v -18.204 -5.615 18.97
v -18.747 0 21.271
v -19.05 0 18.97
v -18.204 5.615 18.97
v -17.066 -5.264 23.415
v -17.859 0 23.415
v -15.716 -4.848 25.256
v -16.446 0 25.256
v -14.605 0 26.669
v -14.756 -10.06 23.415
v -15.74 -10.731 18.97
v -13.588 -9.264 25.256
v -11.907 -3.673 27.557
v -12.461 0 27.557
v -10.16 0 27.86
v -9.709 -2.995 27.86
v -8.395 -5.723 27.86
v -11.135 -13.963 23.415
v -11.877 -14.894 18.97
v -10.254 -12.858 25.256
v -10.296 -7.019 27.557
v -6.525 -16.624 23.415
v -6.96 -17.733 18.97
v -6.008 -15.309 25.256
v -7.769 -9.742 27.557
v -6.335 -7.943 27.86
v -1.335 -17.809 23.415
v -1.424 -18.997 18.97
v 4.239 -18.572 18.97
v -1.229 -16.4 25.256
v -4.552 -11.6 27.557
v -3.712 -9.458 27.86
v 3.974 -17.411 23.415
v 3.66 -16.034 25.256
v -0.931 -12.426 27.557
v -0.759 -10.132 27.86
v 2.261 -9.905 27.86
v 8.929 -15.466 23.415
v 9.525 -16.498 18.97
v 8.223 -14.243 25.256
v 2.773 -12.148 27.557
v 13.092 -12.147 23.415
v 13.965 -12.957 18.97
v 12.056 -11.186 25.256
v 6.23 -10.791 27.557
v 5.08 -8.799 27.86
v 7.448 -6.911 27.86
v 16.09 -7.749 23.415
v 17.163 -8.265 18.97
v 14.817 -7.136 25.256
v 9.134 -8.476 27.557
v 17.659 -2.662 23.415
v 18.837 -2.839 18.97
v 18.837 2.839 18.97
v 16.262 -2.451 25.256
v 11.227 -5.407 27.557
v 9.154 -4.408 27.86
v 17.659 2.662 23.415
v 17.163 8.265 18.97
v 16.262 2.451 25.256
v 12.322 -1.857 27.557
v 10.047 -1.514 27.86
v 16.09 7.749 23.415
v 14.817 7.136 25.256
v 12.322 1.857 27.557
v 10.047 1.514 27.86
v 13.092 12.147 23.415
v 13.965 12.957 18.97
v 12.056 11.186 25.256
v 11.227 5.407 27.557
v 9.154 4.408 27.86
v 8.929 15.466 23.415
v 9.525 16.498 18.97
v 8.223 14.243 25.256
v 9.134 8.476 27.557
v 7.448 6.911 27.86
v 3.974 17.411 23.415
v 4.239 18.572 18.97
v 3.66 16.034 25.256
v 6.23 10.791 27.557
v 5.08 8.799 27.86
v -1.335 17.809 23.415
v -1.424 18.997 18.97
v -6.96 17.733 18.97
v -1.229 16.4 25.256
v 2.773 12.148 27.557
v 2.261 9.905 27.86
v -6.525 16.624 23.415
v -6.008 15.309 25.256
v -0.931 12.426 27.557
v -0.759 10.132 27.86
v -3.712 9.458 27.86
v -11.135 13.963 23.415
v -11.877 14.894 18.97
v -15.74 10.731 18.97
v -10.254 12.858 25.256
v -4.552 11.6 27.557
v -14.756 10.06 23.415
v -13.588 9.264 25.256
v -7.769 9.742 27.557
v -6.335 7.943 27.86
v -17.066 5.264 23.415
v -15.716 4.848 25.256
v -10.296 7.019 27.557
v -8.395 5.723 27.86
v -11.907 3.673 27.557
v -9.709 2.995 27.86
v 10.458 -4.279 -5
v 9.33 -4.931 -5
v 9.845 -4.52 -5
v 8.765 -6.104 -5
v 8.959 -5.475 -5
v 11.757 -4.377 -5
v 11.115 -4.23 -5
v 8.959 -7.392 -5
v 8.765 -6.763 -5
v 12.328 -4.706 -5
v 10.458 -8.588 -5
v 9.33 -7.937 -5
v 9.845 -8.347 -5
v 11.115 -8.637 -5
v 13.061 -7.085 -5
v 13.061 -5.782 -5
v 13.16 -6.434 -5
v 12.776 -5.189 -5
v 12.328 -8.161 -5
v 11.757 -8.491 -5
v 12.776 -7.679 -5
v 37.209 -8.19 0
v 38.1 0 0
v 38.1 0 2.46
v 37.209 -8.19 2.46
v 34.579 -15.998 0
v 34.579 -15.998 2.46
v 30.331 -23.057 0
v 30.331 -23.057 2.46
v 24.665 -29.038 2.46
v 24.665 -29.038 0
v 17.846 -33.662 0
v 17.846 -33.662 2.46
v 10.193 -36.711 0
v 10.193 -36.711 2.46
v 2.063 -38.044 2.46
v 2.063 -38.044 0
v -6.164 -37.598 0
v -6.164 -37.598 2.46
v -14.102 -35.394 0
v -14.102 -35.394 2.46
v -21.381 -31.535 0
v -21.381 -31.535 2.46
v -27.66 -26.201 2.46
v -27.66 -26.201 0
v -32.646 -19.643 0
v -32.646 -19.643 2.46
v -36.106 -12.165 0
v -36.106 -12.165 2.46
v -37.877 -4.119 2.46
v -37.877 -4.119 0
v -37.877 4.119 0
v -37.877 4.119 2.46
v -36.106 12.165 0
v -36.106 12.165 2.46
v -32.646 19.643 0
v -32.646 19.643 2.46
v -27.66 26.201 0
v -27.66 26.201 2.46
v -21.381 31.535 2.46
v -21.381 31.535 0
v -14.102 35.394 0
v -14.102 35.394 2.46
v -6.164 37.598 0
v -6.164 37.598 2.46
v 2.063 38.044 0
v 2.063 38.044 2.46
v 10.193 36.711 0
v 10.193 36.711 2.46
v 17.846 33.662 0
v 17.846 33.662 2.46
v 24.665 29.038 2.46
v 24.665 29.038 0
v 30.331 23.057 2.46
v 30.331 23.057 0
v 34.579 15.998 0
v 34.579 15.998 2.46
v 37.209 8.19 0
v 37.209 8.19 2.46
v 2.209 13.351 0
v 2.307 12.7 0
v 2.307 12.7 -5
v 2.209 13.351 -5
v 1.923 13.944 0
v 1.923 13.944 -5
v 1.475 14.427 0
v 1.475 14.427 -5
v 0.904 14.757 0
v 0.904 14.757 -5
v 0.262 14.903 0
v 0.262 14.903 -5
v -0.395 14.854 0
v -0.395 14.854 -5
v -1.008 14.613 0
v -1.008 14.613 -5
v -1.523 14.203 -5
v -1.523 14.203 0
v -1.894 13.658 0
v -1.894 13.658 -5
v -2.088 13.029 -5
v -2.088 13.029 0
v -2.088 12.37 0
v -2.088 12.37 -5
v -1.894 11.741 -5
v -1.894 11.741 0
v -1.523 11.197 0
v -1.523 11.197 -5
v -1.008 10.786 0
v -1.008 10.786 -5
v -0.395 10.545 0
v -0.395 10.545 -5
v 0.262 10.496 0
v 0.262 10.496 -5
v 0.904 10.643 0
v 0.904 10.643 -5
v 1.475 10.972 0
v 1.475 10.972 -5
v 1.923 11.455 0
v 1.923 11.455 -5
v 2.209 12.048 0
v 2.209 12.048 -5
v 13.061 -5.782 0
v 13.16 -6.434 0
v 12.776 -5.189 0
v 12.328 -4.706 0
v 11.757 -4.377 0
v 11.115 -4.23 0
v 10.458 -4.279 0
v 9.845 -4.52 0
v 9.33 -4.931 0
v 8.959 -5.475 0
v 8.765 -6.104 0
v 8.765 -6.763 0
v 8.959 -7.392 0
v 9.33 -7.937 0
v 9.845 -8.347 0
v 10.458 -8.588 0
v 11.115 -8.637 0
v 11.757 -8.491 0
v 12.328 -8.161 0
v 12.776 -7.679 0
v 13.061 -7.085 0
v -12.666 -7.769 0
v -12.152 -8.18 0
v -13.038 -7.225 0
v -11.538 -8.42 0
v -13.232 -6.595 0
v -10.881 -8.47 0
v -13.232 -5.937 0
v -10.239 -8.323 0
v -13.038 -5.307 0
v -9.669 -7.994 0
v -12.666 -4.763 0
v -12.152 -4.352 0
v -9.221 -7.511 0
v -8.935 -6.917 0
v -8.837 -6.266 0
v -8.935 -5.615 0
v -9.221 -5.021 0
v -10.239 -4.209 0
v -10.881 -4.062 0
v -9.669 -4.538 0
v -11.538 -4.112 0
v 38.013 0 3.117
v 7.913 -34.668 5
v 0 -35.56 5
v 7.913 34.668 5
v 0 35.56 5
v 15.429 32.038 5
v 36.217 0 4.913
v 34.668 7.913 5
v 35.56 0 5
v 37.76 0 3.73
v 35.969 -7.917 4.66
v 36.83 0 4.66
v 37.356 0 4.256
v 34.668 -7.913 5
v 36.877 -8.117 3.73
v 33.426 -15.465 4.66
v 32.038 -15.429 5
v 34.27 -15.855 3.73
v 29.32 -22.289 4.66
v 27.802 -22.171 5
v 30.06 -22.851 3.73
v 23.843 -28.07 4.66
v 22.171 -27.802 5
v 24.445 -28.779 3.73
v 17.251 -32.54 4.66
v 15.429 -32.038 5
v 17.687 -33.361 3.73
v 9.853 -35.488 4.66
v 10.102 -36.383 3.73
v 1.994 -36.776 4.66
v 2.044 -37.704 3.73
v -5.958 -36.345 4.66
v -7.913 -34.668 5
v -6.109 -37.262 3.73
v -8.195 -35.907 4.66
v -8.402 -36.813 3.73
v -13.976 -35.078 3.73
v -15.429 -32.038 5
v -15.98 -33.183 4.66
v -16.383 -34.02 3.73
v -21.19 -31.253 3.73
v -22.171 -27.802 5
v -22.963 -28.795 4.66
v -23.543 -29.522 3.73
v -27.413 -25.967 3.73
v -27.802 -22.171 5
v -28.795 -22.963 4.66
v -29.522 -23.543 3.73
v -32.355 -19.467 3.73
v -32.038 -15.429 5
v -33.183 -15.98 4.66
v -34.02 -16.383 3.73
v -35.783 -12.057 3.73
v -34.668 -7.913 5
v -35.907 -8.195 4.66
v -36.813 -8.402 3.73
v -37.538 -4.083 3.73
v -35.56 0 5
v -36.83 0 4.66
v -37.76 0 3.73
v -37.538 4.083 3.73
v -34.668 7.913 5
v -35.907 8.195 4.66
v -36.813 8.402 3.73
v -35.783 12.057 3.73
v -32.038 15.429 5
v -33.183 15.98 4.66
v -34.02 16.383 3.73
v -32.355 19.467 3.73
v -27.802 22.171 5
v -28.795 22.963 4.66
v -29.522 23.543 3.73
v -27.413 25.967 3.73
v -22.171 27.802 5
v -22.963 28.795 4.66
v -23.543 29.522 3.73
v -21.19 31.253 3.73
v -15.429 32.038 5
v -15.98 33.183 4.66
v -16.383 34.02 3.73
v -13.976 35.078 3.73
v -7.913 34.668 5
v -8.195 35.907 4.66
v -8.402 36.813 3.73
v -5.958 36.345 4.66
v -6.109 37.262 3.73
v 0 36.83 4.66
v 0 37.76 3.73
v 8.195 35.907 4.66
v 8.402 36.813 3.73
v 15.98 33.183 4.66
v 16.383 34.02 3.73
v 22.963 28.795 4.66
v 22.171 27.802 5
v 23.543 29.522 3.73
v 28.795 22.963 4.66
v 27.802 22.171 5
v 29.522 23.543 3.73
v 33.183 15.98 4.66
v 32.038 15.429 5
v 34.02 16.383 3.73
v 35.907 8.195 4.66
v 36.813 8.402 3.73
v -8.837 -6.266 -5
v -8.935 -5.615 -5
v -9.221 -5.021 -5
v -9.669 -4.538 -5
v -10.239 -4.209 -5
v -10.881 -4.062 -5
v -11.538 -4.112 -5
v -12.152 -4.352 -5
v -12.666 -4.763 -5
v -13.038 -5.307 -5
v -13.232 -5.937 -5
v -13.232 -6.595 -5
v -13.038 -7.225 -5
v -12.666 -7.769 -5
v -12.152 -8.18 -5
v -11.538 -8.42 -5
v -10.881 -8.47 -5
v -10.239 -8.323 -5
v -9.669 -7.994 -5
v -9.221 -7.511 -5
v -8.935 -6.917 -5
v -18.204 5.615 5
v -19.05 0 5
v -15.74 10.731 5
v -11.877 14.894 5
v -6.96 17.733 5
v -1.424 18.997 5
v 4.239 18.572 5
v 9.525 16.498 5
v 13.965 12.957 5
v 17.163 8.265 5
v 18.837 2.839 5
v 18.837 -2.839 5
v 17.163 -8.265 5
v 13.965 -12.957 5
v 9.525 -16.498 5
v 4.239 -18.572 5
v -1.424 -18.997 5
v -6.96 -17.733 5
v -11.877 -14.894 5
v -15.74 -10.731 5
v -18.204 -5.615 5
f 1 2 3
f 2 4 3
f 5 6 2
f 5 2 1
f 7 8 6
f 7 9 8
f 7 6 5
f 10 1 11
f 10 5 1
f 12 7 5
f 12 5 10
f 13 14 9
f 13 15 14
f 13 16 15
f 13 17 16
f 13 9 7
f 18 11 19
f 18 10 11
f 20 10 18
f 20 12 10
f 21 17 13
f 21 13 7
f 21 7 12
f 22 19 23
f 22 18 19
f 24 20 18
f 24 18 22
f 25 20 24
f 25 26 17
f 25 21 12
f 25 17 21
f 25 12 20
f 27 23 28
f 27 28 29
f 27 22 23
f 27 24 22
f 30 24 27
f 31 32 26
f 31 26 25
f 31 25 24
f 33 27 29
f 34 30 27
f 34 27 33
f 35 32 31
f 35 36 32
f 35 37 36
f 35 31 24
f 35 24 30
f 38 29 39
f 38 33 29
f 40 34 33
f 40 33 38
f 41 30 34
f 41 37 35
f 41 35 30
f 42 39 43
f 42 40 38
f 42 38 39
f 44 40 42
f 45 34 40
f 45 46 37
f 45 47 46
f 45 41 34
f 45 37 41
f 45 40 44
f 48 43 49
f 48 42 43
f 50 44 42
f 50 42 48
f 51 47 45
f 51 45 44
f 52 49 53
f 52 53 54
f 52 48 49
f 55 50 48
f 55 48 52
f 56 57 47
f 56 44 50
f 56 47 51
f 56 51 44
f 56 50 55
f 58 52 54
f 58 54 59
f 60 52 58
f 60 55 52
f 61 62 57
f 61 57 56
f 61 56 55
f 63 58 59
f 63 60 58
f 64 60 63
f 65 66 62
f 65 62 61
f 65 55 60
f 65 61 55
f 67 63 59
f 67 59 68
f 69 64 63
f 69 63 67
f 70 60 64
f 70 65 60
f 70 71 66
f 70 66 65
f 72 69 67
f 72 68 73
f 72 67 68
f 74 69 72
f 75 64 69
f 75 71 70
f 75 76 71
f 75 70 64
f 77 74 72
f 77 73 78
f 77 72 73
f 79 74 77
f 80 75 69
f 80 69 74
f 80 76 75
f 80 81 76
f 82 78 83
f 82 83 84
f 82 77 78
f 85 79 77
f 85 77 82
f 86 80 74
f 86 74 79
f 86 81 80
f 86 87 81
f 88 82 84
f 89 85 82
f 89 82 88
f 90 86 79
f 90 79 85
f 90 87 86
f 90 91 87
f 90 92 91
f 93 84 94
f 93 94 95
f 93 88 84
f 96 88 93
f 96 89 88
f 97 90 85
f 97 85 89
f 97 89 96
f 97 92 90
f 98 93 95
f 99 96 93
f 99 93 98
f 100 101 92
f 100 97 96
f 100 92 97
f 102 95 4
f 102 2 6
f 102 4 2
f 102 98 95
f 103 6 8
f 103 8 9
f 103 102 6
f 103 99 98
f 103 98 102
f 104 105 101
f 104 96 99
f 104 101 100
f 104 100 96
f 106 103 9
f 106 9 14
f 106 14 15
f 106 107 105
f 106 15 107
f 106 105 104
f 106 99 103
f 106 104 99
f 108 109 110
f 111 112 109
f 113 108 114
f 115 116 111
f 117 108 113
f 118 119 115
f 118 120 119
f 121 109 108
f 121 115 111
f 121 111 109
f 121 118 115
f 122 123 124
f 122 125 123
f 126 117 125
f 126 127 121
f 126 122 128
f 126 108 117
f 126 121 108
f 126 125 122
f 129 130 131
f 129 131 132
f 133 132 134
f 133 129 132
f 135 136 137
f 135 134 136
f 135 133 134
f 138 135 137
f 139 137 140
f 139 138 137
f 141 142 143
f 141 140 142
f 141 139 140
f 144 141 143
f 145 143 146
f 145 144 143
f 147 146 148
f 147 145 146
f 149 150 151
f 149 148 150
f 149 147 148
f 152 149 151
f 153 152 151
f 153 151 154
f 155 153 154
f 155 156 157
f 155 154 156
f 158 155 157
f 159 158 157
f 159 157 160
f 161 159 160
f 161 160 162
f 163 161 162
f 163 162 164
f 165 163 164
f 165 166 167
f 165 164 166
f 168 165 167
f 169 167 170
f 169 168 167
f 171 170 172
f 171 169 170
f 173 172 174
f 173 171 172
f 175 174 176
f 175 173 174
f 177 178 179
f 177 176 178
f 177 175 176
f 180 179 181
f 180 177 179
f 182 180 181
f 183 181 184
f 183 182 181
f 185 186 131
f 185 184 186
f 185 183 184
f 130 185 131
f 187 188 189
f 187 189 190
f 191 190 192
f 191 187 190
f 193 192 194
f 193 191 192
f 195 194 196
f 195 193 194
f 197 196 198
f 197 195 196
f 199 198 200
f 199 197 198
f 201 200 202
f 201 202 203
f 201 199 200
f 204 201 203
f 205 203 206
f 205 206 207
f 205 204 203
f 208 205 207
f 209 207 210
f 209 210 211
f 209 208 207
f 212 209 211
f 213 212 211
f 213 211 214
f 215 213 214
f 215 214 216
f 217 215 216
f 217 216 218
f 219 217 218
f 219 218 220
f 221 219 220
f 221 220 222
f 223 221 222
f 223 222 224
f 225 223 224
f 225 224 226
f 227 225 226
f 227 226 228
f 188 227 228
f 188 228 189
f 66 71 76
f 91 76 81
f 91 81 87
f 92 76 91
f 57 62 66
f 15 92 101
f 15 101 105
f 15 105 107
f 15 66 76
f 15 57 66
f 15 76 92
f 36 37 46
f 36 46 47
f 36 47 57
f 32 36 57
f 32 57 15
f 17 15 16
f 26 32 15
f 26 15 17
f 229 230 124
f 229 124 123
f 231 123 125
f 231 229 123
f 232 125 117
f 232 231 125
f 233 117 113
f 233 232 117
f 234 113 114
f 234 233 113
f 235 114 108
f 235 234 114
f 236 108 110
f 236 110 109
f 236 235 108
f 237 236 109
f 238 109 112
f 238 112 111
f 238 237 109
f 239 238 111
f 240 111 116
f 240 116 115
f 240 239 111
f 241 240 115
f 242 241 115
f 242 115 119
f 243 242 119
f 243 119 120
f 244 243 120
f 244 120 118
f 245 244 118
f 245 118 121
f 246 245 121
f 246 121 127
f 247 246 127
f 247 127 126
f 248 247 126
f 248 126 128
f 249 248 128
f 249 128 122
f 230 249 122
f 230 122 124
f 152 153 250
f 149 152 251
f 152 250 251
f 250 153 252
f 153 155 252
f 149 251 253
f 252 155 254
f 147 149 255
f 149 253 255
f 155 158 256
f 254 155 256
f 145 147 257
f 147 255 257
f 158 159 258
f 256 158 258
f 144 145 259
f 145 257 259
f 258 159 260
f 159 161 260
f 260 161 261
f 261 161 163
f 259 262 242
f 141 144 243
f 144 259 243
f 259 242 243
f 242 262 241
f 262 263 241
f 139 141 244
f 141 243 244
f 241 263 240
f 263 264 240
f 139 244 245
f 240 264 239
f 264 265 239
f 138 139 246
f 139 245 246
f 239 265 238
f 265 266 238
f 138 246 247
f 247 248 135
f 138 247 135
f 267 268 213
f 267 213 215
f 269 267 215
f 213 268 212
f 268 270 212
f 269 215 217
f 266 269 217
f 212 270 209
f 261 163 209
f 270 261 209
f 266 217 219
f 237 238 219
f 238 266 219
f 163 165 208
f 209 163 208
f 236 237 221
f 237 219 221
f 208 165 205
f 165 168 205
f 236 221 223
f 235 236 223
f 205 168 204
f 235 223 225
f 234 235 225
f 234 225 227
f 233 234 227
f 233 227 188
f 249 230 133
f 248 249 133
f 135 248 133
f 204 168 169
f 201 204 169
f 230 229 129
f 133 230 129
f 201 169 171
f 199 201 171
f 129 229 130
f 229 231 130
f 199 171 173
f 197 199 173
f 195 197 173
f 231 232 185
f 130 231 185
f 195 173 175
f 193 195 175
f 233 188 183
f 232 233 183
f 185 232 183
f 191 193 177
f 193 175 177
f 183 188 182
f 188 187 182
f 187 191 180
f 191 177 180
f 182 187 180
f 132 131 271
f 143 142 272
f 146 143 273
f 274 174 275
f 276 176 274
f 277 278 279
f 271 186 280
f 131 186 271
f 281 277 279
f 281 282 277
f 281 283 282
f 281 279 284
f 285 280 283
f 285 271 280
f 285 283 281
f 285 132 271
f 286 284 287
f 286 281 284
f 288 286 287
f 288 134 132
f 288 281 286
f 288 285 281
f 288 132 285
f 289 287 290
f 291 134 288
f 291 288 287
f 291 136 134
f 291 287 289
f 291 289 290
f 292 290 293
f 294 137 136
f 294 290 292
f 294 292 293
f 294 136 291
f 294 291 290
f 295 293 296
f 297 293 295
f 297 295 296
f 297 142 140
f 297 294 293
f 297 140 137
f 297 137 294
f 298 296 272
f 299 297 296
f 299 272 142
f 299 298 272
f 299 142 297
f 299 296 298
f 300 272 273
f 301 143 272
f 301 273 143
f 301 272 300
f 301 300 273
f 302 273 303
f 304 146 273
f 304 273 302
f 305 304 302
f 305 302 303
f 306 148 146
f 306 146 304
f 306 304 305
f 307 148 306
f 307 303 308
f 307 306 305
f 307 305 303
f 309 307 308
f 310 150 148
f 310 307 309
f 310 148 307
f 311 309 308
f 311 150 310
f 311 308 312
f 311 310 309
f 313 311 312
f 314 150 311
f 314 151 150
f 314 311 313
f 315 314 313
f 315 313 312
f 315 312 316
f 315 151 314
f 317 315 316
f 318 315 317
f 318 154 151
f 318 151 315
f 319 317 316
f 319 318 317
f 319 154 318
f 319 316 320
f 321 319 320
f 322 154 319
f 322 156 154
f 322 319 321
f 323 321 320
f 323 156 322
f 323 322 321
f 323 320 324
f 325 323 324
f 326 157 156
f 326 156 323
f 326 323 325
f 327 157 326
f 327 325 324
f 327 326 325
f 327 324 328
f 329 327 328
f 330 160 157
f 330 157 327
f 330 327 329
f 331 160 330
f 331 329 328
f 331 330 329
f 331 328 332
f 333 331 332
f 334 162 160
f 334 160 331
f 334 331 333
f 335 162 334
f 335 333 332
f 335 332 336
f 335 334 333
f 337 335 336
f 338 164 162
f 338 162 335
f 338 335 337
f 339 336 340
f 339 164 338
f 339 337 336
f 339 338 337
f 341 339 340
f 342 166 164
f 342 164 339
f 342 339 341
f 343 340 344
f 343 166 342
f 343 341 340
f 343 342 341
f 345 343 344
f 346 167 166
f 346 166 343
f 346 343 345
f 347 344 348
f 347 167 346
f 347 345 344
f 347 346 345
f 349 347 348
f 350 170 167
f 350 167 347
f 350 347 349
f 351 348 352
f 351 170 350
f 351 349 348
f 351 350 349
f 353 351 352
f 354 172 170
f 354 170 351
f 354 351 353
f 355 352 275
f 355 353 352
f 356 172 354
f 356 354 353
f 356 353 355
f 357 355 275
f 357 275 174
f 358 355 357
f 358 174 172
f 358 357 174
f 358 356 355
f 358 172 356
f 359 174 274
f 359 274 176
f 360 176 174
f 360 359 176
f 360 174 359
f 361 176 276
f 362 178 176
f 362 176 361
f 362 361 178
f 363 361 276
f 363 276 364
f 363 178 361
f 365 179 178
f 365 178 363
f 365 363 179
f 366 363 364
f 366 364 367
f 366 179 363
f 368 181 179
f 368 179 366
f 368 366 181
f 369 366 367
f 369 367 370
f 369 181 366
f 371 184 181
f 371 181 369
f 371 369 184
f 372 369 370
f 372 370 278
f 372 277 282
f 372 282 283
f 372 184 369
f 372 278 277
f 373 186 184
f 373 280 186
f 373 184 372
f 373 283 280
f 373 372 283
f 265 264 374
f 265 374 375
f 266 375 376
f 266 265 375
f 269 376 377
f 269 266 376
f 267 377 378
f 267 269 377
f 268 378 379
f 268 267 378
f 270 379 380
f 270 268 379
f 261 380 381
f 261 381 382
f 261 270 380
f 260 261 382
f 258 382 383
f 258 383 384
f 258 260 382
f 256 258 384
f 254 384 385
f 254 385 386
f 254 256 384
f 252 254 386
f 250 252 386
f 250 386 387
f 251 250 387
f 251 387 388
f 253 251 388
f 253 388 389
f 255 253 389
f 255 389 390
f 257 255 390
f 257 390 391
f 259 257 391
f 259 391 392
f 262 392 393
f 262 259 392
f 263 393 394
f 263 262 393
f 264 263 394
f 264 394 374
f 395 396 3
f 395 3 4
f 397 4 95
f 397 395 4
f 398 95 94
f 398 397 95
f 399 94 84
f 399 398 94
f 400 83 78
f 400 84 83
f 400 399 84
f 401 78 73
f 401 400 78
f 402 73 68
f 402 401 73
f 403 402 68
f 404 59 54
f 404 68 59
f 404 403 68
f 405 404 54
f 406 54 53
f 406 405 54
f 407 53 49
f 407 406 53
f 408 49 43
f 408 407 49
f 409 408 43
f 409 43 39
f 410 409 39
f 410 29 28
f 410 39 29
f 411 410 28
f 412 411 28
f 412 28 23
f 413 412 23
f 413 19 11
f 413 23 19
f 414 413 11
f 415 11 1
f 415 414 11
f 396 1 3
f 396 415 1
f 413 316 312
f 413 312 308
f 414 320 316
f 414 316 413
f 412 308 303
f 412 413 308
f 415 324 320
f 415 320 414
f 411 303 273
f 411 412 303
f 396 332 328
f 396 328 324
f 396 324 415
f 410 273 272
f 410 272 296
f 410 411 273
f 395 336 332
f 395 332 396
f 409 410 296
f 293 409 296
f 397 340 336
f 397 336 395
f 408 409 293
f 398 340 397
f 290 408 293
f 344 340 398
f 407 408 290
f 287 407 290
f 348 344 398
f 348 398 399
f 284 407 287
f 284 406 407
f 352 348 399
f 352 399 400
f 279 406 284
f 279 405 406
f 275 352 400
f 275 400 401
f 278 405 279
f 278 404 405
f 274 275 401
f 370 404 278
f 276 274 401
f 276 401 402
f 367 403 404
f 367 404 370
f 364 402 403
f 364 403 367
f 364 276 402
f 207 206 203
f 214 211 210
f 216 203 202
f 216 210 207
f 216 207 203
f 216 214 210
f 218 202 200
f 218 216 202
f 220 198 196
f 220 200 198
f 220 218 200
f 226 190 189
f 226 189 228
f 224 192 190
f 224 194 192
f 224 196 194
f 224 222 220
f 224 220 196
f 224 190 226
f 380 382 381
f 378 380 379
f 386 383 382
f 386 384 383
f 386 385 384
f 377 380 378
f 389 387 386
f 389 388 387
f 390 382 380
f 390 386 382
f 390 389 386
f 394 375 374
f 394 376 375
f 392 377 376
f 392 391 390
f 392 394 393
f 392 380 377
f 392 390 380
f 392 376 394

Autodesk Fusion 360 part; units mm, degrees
sketch "Sketch2" plane through (0, 0, 0) normal (0, 0, 1) x (1, 0, 0)
  circle A0 centre (0, 0) radius 38.1
  dimension "d15" = 76.2
extrude "Extrude1" add sketch "Sketch2" along normal blind 5
sketch "Sketch3" plane through (0, 0, 5) normal (0, 0, 1) x (-1, 0, 0)
  circle A0 centre (0, 0) radius 38.1
  circle A1 centre (0, 0) radius 19.05
  dimension "d14" = 38.1
extrude "Extrude2" add sketch "Sketch3" along normal blind 22.86 contours A1
sketch "Sketch4" plane through (0, 0, 0) normal (0, 0, -1) x (1, 0, 0)
  circle A0 centre (0, 0) radius 38.1
  circle A1 centre (0.0969, -12.6996) radius 2.2098
  circle A2 centre (10.9498, 6.4337) radius 2.2098
  circle A3 centre (-11.0466, 6.2659) radius 2.2098
  arc A4 (2.2968, -12.4906) -> (11.8992, 4.4383) centre (0, 0) ccw
  arc A5 (9.6688, 8.2343) -> (-9.7933, 8.0859) centre (0, 0) ccw
  arc A6 (-11.9656, 4.2562) -> (-2.106, -12.5242) centre (0, 0) ccw
  dimension "d7" = 4.4196
  dimension "d9" = 360
extrude "Extrude3" add sketch "Sketch4" along normal blind 5 contours A1 | A2 | A3
fillet "Fillet2" radius 8.89 1 edges at (17.7608, 6.8888, 27.86)
fillet "Fillet3" radius 2.54 1 edges at (-35.5217, -13.7775, 5)
